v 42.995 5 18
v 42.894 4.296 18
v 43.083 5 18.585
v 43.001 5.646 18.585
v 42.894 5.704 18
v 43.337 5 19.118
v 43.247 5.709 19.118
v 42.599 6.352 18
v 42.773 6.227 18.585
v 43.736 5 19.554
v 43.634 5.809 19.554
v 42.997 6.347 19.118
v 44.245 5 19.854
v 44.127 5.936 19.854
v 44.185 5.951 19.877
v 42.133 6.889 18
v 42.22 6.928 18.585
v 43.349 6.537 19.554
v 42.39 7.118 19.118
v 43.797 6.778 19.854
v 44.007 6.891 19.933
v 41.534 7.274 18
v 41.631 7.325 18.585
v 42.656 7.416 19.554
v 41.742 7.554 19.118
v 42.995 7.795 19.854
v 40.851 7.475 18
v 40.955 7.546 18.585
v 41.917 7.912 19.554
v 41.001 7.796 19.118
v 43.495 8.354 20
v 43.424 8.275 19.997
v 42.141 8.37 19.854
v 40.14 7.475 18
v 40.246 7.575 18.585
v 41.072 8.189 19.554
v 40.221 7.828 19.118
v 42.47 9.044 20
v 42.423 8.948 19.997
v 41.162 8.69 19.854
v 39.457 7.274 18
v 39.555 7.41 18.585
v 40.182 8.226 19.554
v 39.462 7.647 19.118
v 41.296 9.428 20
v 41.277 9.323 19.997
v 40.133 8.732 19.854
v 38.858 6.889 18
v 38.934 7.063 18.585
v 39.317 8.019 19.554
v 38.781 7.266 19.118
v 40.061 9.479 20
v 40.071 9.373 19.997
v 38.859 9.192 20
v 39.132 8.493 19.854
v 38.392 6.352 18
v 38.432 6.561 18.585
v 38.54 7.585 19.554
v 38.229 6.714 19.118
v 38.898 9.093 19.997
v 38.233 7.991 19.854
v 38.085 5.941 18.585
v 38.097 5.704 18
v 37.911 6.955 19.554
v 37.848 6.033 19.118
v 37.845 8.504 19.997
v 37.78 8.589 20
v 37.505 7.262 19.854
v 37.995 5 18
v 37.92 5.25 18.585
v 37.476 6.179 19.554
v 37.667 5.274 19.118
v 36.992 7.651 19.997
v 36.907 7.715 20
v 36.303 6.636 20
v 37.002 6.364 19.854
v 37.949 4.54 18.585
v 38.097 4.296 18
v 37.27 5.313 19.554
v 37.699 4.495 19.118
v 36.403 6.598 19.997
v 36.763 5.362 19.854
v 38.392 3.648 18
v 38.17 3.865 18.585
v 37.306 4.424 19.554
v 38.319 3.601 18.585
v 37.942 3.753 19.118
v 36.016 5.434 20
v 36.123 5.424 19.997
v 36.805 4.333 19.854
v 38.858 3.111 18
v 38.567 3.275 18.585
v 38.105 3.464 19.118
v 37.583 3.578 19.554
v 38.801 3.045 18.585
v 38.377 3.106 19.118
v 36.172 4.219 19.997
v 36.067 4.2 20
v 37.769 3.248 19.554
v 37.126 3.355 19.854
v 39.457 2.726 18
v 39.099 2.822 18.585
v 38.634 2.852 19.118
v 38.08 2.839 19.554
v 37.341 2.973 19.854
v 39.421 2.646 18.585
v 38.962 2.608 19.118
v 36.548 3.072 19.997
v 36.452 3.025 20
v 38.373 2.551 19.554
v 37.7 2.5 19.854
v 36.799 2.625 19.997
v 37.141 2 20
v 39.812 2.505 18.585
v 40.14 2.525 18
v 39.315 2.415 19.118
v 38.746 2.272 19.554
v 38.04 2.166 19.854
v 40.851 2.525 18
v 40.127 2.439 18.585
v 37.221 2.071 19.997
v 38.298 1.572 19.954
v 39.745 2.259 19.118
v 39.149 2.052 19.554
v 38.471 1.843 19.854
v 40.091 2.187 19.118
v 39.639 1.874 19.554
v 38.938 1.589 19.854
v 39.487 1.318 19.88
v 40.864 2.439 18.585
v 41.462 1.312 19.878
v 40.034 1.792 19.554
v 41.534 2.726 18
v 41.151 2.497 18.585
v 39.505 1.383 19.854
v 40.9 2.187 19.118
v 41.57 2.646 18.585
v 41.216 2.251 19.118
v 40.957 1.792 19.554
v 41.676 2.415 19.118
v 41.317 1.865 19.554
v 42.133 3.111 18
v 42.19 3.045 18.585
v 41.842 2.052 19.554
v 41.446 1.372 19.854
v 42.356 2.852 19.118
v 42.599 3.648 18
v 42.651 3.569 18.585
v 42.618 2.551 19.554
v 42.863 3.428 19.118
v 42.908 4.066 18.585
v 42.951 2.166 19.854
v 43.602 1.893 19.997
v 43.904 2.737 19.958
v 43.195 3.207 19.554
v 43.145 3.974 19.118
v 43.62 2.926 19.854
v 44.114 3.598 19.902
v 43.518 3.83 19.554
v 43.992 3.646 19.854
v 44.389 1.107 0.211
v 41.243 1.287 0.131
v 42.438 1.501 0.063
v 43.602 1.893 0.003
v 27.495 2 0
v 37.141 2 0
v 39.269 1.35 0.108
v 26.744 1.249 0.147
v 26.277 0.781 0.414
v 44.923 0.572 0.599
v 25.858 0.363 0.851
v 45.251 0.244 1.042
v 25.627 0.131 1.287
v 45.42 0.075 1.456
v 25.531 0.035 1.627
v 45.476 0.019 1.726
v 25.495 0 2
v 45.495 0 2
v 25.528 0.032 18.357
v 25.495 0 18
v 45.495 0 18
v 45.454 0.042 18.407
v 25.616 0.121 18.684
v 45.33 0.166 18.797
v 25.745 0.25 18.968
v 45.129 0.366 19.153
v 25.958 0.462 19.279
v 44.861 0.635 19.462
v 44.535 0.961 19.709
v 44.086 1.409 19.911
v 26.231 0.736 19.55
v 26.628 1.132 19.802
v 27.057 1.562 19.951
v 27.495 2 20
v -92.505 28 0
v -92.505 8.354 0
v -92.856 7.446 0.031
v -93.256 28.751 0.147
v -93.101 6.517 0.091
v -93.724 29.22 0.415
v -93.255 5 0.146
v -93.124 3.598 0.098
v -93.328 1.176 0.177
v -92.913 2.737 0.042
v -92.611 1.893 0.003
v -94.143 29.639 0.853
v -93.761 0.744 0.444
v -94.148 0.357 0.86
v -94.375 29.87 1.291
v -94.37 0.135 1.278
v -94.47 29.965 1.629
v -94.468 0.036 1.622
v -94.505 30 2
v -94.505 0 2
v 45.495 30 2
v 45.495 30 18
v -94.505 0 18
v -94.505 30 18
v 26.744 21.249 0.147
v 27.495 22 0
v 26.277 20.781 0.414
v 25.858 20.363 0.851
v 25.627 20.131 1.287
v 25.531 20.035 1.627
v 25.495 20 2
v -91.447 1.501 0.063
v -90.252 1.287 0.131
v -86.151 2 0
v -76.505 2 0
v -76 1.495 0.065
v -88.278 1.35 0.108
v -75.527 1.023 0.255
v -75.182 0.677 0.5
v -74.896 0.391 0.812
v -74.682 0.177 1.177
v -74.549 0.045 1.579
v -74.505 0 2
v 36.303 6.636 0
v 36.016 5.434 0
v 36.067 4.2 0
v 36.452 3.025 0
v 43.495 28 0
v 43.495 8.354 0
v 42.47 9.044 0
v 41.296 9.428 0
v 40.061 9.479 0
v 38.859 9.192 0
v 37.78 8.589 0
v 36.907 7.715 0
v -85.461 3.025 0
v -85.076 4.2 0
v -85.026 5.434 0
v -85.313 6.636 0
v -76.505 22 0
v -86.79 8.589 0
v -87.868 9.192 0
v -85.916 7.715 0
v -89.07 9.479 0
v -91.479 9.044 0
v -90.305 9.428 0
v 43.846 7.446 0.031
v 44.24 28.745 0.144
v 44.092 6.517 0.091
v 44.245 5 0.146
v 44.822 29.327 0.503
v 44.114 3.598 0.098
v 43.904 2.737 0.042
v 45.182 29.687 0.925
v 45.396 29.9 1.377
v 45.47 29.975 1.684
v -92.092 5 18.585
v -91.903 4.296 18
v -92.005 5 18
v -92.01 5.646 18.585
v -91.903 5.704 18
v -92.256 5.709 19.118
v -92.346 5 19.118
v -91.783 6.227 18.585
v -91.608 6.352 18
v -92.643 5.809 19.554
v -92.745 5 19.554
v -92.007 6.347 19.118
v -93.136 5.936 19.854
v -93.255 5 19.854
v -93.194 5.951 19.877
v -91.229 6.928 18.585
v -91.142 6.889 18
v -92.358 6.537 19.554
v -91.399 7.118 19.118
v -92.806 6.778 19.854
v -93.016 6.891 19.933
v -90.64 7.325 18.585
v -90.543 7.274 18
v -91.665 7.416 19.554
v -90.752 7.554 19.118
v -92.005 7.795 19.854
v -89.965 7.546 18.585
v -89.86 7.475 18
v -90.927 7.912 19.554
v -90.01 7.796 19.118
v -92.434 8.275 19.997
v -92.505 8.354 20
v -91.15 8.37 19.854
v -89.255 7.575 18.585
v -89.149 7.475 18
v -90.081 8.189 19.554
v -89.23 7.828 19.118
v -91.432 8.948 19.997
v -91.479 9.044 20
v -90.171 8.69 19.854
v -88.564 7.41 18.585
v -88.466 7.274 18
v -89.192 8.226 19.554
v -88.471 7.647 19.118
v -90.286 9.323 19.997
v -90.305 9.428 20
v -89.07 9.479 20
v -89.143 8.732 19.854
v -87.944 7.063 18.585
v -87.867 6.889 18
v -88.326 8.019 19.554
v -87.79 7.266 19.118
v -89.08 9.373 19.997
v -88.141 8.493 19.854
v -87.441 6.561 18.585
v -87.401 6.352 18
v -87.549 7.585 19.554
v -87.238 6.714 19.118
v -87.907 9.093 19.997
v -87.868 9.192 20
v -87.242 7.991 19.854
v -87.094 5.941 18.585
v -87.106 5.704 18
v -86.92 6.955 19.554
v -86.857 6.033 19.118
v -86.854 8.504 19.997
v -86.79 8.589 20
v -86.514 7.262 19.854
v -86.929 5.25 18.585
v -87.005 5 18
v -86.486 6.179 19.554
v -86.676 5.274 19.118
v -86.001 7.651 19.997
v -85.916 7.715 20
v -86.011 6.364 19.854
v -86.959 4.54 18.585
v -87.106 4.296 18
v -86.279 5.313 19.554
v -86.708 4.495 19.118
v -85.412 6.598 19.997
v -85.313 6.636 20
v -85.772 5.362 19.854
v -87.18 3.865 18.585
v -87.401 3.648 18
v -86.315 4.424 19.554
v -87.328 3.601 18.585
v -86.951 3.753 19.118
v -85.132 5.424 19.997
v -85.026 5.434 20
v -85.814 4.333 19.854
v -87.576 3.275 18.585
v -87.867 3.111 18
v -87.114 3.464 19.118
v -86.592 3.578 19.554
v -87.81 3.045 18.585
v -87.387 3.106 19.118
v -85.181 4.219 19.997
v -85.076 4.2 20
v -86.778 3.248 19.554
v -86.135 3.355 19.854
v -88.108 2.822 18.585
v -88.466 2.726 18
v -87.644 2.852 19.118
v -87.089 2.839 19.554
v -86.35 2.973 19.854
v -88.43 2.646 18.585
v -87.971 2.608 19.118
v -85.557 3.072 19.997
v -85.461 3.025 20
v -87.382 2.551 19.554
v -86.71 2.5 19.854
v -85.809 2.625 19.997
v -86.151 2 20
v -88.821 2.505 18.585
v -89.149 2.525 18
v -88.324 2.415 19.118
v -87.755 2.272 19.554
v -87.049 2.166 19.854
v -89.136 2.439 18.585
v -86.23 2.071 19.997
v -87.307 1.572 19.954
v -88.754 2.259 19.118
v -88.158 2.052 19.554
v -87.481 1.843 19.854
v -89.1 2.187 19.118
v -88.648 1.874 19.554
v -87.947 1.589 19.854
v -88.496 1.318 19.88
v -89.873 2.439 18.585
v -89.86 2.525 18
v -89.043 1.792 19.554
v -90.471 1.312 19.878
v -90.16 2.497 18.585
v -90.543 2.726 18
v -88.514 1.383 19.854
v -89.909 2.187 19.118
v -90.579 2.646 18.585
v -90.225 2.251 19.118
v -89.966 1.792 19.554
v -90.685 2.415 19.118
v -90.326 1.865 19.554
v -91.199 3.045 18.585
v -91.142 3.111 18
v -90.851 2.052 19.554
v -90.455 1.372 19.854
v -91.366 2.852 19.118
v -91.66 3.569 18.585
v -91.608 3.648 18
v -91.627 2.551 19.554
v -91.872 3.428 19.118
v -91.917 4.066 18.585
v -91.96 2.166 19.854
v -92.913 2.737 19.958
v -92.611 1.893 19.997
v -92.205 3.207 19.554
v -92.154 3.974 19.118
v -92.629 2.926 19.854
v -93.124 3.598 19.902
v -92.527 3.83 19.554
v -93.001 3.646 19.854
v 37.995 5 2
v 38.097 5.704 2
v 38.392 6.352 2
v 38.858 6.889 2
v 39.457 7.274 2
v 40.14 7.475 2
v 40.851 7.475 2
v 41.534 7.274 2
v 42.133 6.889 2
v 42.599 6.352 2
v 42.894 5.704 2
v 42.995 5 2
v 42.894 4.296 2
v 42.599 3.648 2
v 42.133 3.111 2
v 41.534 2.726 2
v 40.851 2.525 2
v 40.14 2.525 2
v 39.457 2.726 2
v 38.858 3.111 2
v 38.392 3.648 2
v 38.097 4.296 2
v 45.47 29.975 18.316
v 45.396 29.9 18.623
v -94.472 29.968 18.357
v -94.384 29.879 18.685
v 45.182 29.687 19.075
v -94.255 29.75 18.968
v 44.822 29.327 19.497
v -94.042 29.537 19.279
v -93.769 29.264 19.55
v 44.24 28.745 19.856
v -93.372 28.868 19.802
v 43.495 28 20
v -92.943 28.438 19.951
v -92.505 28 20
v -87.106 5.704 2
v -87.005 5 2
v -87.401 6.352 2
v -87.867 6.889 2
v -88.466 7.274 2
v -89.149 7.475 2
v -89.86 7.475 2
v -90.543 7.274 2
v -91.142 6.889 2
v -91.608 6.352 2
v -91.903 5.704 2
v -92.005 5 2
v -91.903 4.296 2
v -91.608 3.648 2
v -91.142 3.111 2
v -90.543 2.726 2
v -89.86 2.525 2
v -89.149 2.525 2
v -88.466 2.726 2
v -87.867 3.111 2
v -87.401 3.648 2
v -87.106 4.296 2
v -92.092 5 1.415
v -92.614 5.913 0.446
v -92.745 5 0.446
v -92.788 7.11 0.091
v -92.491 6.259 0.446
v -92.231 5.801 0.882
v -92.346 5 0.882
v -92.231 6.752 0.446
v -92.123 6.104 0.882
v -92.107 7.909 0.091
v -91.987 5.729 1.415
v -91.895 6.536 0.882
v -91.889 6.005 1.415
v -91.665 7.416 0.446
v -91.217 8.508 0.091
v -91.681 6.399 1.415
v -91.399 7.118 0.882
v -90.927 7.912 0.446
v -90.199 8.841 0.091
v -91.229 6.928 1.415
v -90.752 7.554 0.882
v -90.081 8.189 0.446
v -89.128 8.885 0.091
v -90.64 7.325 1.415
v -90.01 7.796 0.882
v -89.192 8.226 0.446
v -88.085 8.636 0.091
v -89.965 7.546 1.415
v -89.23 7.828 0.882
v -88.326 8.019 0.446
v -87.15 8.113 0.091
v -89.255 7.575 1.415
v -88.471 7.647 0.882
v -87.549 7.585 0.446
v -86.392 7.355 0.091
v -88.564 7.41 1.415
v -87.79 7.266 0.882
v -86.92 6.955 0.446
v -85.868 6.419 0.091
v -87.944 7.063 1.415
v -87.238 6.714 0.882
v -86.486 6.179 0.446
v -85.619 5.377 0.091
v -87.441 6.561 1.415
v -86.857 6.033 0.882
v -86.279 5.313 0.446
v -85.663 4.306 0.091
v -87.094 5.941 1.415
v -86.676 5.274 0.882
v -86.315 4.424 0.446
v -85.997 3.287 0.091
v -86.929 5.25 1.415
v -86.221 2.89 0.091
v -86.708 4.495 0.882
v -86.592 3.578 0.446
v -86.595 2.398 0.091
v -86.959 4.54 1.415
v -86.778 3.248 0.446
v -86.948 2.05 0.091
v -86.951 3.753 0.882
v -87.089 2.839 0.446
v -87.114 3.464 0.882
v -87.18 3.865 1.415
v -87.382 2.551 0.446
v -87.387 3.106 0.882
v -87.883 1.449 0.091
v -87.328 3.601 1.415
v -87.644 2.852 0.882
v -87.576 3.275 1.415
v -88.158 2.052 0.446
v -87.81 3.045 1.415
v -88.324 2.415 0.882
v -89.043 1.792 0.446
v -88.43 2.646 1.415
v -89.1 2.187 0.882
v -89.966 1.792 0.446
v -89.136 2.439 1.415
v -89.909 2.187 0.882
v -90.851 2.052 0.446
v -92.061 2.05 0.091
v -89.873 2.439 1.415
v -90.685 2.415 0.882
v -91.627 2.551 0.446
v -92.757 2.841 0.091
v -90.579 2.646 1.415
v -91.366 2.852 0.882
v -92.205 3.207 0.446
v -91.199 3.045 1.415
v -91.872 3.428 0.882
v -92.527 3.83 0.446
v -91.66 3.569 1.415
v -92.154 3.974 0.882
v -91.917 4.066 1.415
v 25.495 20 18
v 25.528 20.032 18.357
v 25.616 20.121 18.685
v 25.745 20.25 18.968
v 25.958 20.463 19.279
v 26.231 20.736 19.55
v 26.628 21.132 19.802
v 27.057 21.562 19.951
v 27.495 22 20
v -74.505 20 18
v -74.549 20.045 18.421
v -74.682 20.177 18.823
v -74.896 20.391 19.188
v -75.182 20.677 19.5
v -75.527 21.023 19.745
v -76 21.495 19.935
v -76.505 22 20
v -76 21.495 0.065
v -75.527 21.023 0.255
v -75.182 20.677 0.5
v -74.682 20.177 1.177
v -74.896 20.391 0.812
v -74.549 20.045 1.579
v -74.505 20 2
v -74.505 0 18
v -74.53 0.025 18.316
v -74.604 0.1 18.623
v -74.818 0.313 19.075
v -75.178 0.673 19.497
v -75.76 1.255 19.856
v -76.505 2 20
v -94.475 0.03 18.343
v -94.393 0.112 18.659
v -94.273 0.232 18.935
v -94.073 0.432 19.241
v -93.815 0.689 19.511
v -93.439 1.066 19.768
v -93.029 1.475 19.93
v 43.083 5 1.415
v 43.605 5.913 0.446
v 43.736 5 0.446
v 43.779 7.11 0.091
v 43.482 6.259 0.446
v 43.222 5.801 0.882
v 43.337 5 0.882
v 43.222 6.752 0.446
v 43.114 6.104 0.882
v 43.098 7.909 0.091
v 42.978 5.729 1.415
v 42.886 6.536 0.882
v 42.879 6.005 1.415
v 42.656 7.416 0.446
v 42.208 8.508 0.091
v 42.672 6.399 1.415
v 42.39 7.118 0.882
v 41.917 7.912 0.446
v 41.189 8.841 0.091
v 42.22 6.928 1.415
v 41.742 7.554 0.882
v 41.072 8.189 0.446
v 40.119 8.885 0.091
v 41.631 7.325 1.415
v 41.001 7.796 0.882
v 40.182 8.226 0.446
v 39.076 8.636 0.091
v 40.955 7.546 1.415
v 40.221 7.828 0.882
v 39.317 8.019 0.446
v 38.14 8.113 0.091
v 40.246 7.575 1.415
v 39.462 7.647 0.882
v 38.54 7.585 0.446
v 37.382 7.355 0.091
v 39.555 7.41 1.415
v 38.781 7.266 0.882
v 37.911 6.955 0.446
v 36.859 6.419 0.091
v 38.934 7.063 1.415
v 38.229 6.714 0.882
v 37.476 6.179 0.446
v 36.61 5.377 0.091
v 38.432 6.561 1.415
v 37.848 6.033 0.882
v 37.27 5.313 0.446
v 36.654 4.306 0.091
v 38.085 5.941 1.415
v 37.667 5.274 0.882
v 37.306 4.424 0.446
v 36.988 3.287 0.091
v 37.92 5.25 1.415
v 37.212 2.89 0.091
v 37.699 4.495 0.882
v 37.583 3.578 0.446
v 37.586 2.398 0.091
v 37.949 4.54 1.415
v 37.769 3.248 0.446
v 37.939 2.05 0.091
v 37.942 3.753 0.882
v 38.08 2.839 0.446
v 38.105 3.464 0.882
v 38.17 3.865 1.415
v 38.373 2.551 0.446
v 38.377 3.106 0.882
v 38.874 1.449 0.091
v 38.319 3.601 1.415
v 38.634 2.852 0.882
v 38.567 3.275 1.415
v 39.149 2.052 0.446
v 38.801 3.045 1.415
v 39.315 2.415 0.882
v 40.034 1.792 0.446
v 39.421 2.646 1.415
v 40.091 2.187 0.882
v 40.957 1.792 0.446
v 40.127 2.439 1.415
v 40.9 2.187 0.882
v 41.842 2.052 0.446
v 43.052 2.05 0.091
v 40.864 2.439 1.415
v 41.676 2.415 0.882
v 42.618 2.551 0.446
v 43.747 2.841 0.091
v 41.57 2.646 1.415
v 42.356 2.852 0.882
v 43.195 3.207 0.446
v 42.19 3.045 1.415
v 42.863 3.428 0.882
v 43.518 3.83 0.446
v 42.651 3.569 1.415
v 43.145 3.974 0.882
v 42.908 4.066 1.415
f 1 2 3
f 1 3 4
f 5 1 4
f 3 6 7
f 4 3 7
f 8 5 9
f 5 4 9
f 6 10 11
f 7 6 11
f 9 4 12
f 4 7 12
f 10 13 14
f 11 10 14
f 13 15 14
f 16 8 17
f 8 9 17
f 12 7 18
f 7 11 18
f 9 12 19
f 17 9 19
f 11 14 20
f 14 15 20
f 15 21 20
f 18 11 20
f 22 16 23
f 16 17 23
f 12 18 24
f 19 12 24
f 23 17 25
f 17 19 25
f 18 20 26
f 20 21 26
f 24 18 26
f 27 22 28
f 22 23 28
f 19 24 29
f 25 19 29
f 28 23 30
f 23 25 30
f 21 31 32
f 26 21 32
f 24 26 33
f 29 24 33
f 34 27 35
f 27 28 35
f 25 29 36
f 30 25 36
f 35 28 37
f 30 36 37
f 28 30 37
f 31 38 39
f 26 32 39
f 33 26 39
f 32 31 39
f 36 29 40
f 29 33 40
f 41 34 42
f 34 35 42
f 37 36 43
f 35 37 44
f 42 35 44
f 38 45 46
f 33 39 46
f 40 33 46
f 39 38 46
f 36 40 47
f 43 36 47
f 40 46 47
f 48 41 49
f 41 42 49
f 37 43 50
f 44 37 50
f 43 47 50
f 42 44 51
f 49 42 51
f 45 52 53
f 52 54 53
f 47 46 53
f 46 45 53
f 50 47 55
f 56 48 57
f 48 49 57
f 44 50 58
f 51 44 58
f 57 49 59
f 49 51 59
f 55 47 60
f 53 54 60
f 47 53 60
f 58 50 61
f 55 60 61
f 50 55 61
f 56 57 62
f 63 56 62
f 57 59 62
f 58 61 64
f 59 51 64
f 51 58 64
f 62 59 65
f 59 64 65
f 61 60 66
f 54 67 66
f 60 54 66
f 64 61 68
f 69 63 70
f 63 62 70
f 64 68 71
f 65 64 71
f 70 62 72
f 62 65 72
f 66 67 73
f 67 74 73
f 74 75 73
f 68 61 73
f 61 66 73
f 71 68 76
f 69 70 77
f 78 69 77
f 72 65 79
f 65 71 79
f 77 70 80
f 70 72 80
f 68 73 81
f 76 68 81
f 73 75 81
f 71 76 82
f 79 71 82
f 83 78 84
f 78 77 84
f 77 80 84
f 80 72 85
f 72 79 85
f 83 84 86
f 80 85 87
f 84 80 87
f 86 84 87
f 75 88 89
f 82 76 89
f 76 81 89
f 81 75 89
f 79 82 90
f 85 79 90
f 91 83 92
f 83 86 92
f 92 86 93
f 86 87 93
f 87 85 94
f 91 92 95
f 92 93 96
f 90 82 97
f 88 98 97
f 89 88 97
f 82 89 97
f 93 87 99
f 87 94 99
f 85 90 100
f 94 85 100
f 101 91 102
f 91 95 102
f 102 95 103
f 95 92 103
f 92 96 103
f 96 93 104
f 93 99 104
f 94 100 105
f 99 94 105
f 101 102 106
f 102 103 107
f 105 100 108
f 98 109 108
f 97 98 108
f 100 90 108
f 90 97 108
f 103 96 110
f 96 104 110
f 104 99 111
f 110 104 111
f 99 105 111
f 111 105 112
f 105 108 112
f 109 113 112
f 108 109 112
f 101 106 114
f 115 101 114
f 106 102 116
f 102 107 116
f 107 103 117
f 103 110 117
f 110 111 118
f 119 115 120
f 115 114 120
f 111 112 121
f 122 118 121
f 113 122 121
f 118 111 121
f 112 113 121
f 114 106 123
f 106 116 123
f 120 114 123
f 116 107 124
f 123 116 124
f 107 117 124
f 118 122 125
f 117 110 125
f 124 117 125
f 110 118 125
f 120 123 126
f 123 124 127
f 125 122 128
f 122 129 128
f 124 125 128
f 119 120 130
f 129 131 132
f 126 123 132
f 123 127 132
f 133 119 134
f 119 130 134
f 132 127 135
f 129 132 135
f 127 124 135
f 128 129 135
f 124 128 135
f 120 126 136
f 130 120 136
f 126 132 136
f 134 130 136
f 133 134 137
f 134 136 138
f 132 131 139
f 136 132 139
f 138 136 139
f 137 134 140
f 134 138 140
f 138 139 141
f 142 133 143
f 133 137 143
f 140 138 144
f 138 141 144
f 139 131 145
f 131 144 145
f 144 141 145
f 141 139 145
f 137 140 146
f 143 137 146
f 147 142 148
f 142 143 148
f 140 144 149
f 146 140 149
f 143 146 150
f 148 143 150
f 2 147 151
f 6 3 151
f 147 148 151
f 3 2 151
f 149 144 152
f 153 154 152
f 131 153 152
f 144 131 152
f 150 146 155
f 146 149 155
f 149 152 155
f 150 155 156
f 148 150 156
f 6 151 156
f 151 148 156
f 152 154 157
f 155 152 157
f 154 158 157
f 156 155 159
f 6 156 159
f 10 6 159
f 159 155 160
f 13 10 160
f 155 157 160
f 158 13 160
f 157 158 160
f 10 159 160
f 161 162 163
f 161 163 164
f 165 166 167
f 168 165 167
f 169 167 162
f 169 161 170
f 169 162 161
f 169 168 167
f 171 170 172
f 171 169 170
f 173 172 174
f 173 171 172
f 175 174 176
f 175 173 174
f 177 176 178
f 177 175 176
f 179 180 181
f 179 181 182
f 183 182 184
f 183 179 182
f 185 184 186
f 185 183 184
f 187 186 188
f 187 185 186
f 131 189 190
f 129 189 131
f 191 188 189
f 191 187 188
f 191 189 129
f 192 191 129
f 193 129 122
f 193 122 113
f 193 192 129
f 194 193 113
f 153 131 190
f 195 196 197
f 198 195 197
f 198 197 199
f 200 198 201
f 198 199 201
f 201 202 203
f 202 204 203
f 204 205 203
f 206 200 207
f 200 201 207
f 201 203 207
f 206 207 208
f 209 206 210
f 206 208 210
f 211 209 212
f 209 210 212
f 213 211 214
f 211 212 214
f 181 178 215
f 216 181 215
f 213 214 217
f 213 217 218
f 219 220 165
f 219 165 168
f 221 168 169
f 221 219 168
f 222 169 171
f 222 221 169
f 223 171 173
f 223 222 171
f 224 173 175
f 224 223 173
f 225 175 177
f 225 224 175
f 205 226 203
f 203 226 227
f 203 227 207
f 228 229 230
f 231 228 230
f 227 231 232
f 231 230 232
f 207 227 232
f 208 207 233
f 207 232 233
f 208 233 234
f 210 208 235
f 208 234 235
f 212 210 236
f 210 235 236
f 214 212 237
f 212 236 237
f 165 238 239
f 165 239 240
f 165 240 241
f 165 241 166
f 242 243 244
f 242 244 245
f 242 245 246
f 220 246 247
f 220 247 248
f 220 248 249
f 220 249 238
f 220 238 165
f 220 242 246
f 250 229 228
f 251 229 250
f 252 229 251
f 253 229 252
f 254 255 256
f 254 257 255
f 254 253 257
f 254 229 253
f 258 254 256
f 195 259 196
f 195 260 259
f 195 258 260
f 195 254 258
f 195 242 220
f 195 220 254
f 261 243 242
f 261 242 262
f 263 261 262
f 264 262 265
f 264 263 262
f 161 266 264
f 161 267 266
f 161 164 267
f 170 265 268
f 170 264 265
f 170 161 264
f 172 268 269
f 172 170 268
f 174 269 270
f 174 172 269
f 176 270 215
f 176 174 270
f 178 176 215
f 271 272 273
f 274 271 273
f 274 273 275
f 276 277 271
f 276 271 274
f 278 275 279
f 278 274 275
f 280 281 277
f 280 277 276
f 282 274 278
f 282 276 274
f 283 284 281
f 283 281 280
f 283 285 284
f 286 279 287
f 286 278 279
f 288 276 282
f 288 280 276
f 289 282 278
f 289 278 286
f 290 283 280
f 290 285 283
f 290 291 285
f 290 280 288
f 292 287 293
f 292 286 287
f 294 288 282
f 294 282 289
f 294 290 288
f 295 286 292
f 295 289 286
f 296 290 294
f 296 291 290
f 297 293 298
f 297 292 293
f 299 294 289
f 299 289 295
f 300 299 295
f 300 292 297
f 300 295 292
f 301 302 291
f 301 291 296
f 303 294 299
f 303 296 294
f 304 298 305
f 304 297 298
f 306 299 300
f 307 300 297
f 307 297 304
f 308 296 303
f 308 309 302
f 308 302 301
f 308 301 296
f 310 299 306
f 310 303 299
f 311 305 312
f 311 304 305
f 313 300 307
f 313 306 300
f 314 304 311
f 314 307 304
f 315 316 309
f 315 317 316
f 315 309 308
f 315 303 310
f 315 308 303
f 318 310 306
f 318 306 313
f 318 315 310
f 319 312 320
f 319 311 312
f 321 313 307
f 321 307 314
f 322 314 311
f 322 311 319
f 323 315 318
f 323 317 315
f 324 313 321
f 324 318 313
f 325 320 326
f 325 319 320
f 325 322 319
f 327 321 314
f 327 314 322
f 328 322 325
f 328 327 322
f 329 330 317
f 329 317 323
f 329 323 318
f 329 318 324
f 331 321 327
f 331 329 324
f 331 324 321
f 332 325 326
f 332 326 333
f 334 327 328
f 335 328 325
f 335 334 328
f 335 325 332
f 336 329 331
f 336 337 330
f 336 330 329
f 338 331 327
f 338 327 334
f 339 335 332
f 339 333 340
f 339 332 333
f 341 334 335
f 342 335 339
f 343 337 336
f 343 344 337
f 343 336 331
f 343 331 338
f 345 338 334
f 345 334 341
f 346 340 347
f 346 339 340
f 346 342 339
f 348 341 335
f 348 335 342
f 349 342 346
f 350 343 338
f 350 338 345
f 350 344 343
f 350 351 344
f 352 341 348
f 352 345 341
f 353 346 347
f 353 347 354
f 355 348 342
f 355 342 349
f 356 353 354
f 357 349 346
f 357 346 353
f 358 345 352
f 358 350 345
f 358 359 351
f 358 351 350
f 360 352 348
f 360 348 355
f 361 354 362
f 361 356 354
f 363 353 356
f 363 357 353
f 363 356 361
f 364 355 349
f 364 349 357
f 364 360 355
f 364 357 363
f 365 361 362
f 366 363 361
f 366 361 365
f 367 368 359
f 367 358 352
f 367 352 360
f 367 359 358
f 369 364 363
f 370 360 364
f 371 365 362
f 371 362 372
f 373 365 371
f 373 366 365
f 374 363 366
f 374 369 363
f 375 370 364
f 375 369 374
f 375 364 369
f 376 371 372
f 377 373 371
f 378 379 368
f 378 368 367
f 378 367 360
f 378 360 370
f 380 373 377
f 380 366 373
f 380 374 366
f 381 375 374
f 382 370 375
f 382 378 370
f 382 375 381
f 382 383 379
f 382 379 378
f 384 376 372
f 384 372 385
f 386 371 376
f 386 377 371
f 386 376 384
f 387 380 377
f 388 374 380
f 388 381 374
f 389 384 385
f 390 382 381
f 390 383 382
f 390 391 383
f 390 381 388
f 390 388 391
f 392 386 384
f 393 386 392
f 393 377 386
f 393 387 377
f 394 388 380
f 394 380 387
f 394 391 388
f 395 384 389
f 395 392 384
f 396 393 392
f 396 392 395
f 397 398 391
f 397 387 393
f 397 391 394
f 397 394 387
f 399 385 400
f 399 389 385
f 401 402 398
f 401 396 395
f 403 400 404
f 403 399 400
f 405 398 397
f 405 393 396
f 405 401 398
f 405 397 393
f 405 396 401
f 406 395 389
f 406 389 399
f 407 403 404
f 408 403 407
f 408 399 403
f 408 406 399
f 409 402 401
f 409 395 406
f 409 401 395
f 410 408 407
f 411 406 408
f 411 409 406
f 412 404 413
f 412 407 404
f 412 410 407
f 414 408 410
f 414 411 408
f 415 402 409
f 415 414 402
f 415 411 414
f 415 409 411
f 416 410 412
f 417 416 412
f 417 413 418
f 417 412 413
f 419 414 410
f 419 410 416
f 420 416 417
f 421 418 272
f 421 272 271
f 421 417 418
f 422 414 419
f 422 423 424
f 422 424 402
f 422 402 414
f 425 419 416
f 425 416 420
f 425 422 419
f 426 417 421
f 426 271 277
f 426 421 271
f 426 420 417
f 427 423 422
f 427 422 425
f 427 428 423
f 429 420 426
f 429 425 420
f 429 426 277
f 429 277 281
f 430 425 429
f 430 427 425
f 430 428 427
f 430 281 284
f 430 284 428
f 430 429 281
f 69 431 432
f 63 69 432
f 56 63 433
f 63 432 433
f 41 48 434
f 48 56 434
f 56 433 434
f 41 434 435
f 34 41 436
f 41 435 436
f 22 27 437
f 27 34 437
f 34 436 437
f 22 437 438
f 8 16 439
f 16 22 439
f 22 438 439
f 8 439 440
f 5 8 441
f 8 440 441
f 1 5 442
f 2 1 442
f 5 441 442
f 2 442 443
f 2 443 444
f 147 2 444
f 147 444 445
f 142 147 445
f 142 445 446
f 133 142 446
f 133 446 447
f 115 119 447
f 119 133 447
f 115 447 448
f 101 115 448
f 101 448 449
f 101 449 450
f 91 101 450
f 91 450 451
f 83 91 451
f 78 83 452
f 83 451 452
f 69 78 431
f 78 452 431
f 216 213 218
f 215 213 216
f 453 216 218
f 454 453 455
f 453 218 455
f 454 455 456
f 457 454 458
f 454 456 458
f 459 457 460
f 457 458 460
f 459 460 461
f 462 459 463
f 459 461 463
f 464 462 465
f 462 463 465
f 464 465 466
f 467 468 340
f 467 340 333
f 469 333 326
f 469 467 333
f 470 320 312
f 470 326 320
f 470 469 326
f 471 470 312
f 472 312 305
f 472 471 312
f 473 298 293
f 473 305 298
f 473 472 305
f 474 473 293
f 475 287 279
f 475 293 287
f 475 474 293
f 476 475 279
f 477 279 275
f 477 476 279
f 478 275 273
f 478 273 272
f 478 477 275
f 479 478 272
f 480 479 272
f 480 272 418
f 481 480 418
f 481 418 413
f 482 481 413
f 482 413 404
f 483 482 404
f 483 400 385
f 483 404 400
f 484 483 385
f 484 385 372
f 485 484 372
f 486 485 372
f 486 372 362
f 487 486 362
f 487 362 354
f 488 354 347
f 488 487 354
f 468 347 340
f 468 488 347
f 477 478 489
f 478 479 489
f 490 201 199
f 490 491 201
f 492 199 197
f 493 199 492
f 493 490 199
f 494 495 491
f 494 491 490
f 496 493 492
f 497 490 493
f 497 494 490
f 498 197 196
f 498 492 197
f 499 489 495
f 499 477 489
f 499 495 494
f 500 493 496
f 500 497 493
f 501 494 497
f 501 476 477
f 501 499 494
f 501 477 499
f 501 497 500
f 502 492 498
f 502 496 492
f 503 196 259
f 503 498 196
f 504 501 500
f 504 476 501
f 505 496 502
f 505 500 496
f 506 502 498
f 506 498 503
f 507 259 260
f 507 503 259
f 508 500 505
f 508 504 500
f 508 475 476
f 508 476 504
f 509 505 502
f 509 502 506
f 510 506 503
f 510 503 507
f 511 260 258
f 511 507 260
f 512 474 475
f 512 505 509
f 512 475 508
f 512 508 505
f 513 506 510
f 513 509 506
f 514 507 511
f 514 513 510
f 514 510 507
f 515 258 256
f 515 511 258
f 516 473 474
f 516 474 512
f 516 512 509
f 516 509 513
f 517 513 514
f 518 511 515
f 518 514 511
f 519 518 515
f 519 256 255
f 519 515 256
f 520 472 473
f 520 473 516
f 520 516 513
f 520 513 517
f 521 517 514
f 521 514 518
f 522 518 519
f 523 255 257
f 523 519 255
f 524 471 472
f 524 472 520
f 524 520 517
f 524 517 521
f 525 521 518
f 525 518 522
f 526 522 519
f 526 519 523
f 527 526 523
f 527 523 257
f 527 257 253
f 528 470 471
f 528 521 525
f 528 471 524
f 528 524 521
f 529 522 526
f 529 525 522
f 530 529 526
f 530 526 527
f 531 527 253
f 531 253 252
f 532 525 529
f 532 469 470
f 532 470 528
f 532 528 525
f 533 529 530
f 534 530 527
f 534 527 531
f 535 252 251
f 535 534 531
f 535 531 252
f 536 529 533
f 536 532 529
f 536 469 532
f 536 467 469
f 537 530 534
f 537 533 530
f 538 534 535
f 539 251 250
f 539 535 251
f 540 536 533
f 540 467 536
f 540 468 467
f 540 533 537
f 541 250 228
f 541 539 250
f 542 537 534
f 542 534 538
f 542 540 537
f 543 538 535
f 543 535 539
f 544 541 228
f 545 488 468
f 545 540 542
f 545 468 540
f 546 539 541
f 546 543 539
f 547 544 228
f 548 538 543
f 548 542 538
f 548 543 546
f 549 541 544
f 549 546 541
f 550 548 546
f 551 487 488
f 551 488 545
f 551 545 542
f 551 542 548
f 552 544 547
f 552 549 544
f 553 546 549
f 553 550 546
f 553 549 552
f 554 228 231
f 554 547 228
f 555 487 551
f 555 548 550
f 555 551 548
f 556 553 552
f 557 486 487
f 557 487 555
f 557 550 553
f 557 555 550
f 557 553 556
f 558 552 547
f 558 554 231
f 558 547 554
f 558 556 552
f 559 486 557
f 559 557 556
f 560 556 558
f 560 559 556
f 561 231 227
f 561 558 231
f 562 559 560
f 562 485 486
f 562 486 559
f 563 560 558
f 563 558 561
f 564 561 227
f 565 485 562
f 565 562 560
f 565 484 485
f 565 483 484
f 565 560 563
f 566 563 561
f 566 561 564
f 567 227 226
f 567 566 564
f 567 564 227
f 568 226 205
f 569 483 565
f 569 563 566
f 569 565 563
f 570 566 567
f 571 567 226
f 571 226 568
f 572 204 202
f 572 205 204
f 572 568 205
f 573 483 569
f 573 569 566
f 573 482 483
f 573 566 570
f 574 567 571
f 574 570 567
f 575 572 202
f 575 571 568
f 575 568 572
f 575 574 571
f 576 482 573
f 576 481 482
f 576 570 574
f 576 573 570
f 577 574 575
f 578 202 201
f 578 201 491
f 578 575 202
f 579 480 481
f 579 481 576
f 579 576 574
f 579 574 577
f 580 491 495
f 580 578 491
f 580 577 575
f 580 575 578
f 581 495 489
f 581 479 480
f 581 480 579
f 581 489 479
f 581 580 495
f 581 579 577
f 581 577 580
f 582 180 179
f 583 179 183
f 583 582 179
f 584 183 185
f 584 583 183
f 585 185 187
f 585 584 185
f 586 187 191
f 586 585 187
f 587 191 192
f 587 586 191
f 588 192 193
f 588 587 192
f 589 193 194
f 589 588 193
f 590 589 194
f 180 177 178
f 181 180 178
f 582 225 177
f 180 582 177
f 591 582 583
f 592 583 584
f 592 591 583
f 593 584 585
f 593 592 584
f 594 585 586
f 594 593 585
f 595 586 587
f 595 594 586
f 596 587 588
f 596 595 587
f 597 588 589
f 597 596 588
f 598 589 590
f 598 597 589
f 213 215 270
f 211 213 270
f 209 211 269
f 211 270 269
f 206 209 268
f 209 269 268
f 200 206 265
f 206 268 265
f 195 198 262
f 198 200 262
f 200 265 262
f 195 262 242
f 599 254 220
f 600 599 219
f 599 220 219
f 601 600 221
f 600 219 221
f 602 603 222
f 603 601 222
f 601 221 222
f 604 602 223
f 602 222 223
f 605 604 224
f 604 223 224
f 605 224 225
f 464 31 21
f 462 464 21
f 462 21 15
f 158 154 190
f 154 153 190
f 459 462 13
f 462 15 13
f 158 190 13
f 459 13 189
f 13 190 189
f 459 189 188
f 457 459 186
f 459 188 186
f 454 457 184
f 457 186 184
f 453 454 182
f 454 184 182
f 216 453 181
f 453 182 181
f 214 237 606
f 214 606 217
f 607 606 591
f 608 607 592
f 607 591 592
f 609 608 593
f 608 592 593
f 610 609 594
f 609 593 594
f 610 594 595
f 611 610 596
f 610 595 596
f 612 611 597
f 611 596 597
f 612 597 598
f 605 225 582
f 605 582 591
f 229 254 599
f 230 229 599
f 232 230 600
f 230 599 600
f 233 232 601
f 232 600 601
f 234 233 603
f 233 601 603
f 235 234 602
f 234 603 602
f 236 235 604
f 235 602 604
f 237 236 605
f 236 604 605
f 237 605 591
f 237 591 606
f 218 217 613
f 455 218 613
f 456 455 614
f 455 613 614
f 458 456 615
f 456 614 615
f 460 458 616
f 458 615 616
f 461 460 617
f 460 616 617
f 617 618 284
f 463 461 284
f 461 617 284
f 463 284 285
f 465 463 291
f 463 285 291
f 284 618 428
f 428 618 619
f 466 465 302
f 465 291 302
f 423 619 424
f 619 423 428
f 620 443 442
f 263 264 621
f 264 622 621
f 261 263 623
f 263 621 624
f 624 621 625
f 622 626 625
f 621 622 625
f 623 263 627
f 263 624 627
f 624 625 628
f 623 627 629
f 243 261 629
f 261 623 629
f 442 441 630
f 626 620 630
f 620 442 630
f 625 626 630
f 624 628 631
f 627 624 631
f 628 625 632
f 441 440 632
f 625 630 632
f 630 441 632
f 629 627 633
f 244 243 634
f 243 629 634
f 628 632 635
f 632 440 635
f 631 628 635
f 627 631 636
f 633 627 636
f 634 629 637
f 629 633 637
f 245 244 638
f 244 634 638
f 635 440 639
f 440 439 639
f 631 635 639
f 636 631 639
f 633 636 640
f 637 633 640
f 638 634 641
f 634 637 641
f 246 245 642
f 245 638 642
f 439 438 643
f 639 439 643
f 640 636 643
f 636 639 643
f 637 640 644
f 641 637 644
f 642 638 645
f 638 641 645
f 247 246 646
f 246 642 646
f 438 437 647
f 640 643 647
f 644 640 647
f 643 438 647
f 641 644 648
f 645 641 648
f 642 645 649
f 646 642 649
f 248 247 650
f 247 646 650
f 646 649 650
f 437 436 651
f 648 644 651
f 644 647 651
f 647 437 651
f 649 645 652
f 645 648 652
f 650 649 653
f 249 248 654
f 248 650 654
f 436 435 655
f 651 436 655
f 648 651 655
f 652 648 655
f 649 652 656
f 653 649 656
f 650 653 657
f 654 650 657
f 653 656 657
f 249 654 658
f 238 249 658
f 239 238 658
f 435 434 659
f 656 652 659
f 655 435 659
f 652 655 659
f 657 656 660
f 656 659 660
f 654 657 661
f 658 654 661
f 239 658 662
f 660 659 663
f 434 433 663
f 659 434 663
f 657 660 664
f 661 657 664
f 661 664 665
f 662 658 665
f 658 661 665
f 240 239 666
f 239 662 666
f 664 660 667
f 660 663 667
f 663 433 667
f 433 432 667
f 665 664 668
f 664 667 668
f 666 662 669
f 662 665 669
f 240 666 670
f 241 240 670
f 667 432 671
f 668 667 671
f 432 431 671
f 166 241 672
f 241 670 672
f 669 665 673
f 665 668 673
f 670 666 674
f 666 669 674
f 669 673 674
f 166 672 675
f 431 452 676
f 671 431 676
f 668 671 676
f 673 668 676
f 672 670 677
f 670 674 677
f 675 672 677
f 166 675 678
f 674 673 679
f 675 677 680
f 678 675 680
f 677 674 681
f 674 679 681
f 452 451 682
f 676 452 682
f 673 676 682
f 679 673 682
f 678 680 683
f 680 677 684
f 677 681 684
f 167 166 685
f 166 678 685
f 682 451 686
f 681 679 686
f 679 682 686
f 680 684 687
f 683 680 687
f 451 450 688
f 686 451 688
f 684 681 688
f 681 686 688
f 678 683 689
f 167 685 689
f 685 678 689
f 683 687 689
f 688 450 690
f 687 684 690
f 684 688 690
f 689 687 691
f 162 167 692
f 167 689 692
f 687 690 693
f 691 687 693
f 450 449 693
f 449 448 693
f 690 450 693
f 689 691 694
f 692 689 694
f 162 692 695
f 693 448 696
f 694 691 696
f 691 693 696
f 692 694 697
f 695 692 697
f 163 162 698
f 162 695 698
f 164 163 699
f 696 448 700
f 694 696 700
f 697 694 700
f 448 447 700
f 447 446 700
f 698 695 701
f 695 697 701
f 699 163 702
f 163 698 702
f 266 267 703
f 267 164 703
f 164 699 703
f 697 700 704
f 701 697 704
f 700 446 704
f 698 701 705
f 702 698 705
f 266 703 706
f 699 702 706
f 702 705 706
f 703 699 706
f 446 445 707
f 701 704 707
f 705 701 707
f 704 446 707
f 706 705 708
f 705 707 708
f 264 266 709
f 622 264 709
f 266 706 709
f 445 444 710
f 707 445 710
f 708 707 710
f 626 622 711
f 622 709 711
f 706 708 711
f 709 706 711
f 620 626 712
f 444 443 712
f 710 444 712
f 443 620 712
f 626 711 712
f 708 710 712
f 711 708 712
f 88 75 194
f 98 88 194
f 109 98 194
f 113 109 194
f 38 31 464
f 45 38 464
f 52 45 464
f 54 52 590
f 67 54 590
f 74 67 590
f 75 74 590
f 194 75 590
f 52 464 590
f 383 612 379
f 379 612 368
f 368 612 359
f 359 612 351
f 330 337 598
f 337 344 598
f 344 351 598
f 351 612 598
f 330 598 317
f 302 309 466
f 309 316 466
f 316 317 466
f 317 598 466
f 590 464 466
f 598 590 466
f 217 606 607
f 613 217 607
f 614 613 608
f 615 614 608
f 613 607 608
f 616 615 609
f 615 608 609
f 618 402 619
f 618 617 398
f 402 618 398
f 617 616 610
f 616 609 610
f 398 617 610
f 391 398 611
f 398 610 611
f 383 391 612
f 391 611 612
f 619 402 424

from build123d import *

# Parameters (mm, degrees)
F1_DEPTH     = 20
F3_D         = 5
F5_T3_DEPTH  = 150
F5_T6_DEPTH  = 40
F5_T9_DEPTH  = 30
F5_T12_DEPTH = 25
F5_T15_DEPTH = 100
F5_T18_DEPTH = 25
F5_T21_DEPTH = 30
F5_T24_DEPTH = 40
F5_T33_DEPTH = 150
F5_T36_DEPTH = 40
F5_T39_DEPTH = 30
F5_T42_DEPTH = 25
F5_T45_DEPTH = 100
F5_T48_DEPTH = 25
F5_T51_DEPTH = 30
F5_T54_DEPTH = 40
F5_T64_DEPTH = 105
F5_T68_DEPTH = 30
F5_T74_DEPTH = 30
F5_T78_DEPTH = 105
F5_T84_DEPTH = 30
F5_T88_DEPTH = 105
F5_T94_DEPTH = 105
F5_T98_DEPTH = 30


# Not quite as in the source:
# - a fillet or chamfer that OpenCascade refuses, or shapes differently, is made with other operations: its cross-section is extruded or revolved along the edge and cut away or added


with BuildPart() as f1:
    # F0 (on Top) → F1 (new body)
    with BuildSketch(Plane.XY):
        Polygon((45.4953936456, 30), (-24.5046063544, 30), (-24.5046063544, 20), (25.4953936456, 20), (25.4953936456, 0), (45.4953936456, 0), align=None)
    extrude(amount=F1_DEPTH)

    # F3 (through all)
    with Locations(Plane.XY.offset(20)):
        with Locations((40.4953936456, 5)):
            Hole(F3_D / 2)

    # F4: F1 across face


with BuildPart() as f1_1:
    add(f1.part)
    add(f1.part.mirror(Plane(origin=(-24.5046063544, 25, 10), x_dir=(0, -1, 0), z_dir=(-1, 0, 0))))

    # F5: fillet of radius 2 on 20 edges, made by hand


with BuildPart() as f5_tool1:
    # F5_s2 → F5_t3 (new body)
    with BuildSketch(Plane.YZ.offset(-99.5046063544)):
        with BuildLine():
            ThreePointArc((30, 18), (29.4142135624, 19.4142135624), (28, 20))
            Line((28, 20), (30, 20))
            Line((30, 20), (30, 18))
        make_face()
    extrude(amount=F5_T3_DEPTH)


with BuildPart() as f5_tool4:
    # F5_s5 → F5_t6 (new body)
    with BuildSketch(Plane.XZ.offset(5)):
        with BuildLine():
            ThreePointArc((-94.5046063544, 18), (-93.9188199167, 19.4142135624), (-92.5046063544, 20))
            Line((-92.5046063544, 20), (-94.5046063544, 20))
            Line((-94.5046063544, 20), (-94.5046063544, 18))
        make_face()
    extrude(amount=-F5_T6_DEPTH)


with BuildPart() as f5_tool7:
    # F5_s8 → F5_t9 (new body)
    with BuildSketch(Plane.YZ.offset(-69.5046063544)):
        with BuildLine():
            ThreePointArc((0, 18), (0.5857864376, 19.4142135624), (2, 20))
            Line((2, 20), (0, 20))
            Line((0, 20), (0, 18))
        make_face()
    extrude(amount=-F5_T9_DEPTH)


with BuildPart() as f5_tool10:
    # F5_s11 → F5_t12 (new body)
    with BuildSketch(Plane.XZ.offset(-20)):
        with BuildLine():
            ThreePointArc((-74.5046063544, 18), (-75.090392792, 19.4142135624), (-76.5046063544, 20))
            Line((-76.5046063544, 20), (-74.5046063544, 20))
            Line((-74.5046063544, 20), (-74.5046063544, 18))
        make_face()
    extrude(amount=F5_T12_DEPTH)


with BuildPart() as f5_tool13:
    # F5_s14 → F5_t15 (new body)
    with BuildSketch(Plane.YZ.offset(-74.5046063544)):
        with BuildLine():
            ThreePointArc((20, 18), (20.5857864376, 19.4142135624), (22, 20))
            Line((22, 20), (20, 20))
            Line((20, 20), (20, 18))
        make_face()
    extrude(amount=F5_T15_DEPTH)


with BuildPart() as f5_tool16:
    # F5_s17 → F5_t18 (new body)
    with BuildSketch(Plane.XZ.offset(-20)):
        with BuildLine():
            ThreePointArc((25.4953936456, 18), (26.0811800833, 19.4142135624), (27.4953936456, 20))
            Line((27.4953936456, 20), (25.4953936456, 20))
            Line((25.4953936456, 20), (25.4953936456, 18))
        make_face()
    extrude(amount=F5_T18_DEPTH)


with BuildPart() as f5_tool19:
    # F5_s20 → F5_t21 (new body)
    with BuildSketch(Plane.YZ.offset(20.4953936456)):
        with BuildLine():
            ThreePointArc((0, 18), (0.5857864376, 19.4142135624), (2, 20))
            Line((2, 20), (0, 20))
            Line((0, 20), (0, 18))
        make_face()
    extrude(amount=F5_T21_DEPTH)


with BuildPart() as f5_tool22:
    # F5_s23 → F5_t24 (new body)
    with BuildSketch(Plane.XZ.offset(5)):
        with BuildLine():
            ThreePointArc((43.4953936456, 20), (44.909607208, 19.4142135624), (45.4953936456, 18))
            Line((45.4953936456, 18), (45.4953936456, 20))
            Line((45.4953936456, 20), (43.4953936456, 20))
        make_face()
    extrude(amount=-F5_T24_DEPTH)


with BuildPart() as f5_tool25:
    # F5_s26 → F5_t27 (revolve)
    with BuildSketch(Plane.XZ.offset(-5)):
        with BuildLine():
            ThreePointArc((42.9953936456, 18), (43.5811800833, 19.4142135624), (44.9953936456, 20))
            Line((44.9953936456, 20), (42.9953936456, 20))
            Line((42.9953936456, 20), (42.9953936456, 18))
        make_face()
    revolve(axis=Axis((40.4953936456, 5, 20), (0, 0, 1)))


with BuildPart() as f5_tool28:
    # F5_s29 → F5_t30 (revolve)
    with BuildSketch(Plane.XZ.offset(-5)):
        with BuildLine():
            ThreePointArc((-92.0046063544, 18), (-92.590392792, 19.4142135624), (-94.0046063544, 20))
            Line((-94.0046063544, 20), (-92.0046063544, 20))
            Line((-92.0046063544, 20), (-92.0046063544, 18))
        make_face()
    revolve(axis=Axis((-89.5046063544, 5, 20), (0, 0, -1)))


with BuildPart() as f5_tool31:
    # F5_s32 → F5_t33 (new body)
    with BuildSketch(Plane.YZ.offset(50.4953936456)):
        with BuildLine():
            ThreePointArc((30, 2), (29.4142135624, 0.5857864376), (28, 0))
            Line((28, 0), (30, 0))
            Line((30, 0), (30, 2))
        make_face()
    extrude(amount=-F5_T33_DEPTH)


with BuildPart() as f5_tool34:
    # F5_s35 → F5_t36 (new body)
    with BuildSketch(Plane.XZ.offset(5)):
        with BuildLine():
            ThreePointArc((-92.5046063544, 0), (-93.9188199167, 0.5857864376), (-94.5046063544, 2))
            Line((-94.5046063544, 2), (-94.5046063544, 0))
            Line((-94.5046063544, 0), (-92.5046063544, 0))
        make_face()
    extrude(amount=-F5_T36_DEPTH)


with BuildPart() as f5_tool37:
    # F5_s38 → F5_t39 (new body)
    with BuildSketch(Plane.YZ.offset(-69.5046063544)):
        with BuildLine():
            ThreePointArc((2, 0), (0.5857864376, 0.5857864376), (0, 2))
            Line((0, 2), (0, 0))
            Line((0, 0), (2, 0))
        make_face()
    extrude(amount=-F5_T39_DEPTH)


with BuildPart() as f5_tool40:
    # F5_s41 → F5_t42 (new body)
    with BuildSketch(Plane.XZ.offset(-20)):
        with BuildLine():
            ThreePointArc((-76.5046063544, 0), (-75.090392792, 0.5857864376), (-74.5046063544, 2))
            Line((-74.5046063544, 2), (-74.5046063544, 0))
            Line((-74.5046063544, 0), (-76.5046063544, 0))
        make_face()
    extrude(amount=F5_T42_DEPTH)


with BuildPart() as f5_tool43:
    # F5_s44 → F5_t45 (new body)
    with BuildSketch(Plane.YZ.offset(25.4953936456)):
        with BuildLine():
            ThreePointArc((22, 0), (20.5857864376, 0.5857864376), (20, 2))
            Line((20, 2), (20, 0))
            Line((20, 0), (22, 0))
        make_face()
    extrude(amount=-F5_T45_DEPTH)


with BuildPart() as f5_tool46:
    # F5_s47 → F5_t48 (new body)
    with BuildSketch(Plane.XZ.offset(-20)):
        with BuildLine():
            ThreePointArc((27.4953936456, 0), (26.0811800833, 0.5857864376), (25.4953936456, 2))
            Line((25.4953936456, 2), (25.4953936456, 0))
            Line((25.4953936456, 0), (27.4953936456, 0))
        make_face()
    extrude(amount=F5_T48_DEPTH)


with BuildPart() as f5_tool49:
    # F5_s50 → F5_t51 (new body)
    with BuildSketch(Plane.YZ.offset(20.4953936456)):
        with BuildLine():
            ThreePointArc((2, 0), (0.5857864376, 0.5857864376), (0, 2))
            Line((0, 2), (0, 0))
            Line((0, 0), (2, 0))
        make_face()
    extrude(amount=F5_T51_DEPTH)


with BuildPart() as f5_tool52:
    # F5_s53 → F5_t54 (new body)
    with BuildSketch(Plane.XZ.offset(5)):
        with BuildLine():
            ThreePointArc((43.4953936456, 0), (44.909607208, 0.5857864376), (45.4953936456, 2))
            Line((45.4953936456, 2), (45.4953936456, 0))
            Line((45.4953936456, 0), (43.4953936456, 0))
        make_face()
    extrude(amount=-F5_T54_DEPTH)


with BuildPart() as f5_tool55:
    # F5_s56 → F5_t57 (revolve)
    with BuildSketch(Plane.XZ.offset(-5)):
        with BuildLine():
            ThreePointArc((44.9953936456, 0), (43.5811800833, 0.5857864376), (42.9953936456, 2))
            Line((42.9953936456, 2), (42.9953936456, 0))
            Line((42.9953936456, 0), (44.9953936456, 0))
        make_face()
    revolve(axis=Axis((40.4953936456, 5, 0), (0, 0, 1)))


with BuildPart() as f5_tool58:
    # F5_s59 → F5_t60 (revolve)
    with BuildSketch(Plane.XZ.offset(-5)):
        with BuildLine():
            ThreePointArc((-94.0046063544, 0), (-92.590392792, 0.5857864376), (-92.0046063544, 2))
            Line((-92.0046063544, 2), (-92.0046063544, 0))
            Line((-92.0046063544, 0), (-94.0046063544, 0))
        make_face()
    revolve(axis=Axis((-89.5046063544, 5, 0), (0, 0, -1)))


with BuildPart() as f5_tool62:
    # F5_s63 → F5_t64 (new body)
    with BuildSketch(Plane.YZ.offset(-79.5046063544)):
        with BuildLine():
            ThreePointArc((20, 18), (20.5857864376, 19.4142135624), (22, 20))
            Line((22, 20), (20, 20))
            Line((20, 20), (20, 18))
        make_face()
    extrude(amount=F5_T64_DEPTH)

    split(bisect_by=Plane.YZ.offset(-74.5046063544), keep=Keep.BOTTOM)


with BuildPart() as f5_tool66:
    # F5_s67 → F5_t68 (new body)
    with BuildSketch(Plane.XZ.offset(-25)):
        with BuildLine():
            ThreePointArc((-74.5046063544, 18), (-75.090392792, 19.4142135624), (-76.5046063544, 20))
            Line((-76.5046063544, 20), (-74.5046063544, 20))
            Line((-74.5046063544, 20), (-74.5046063544, 18))
        make_face()
    extrude(amount=F5_T68_DEPTH)

    split(bisect_by=Plane.XZ.offset(-20), keep=Keep.BOTTOM)


with BuildPart() as f5_tool62_1:
    add(f5_tool62.part)

    # F5_t70: intersect F5_tool66
    add(f5_tool66.part, mode=Mode.INTERSECT)


with BuildPart() as f5_tool72:
    # F5_s73 → F5_t74 (new body)
    with BuildSketch(Plane.XZ.offset(-25)):
        with BuildLine():
            ThreePointArc((25.4953936456, 18), (26.0811800833, 19.4142135624), (27.4953936456, 20))
            Line((27.4953936456, 20), (25.4953936456, 20))
            Line((25.4953936456, 20), (25.4953936456, 18))
        make_face()
    extrude(amount=F5_T74_DEPTH)

    split(bisect_by=Plane.XZ.offset(-20), keep=Keep.BOTTOM)


with BuildPart() as f5_tool76:
    # F5_s77 → F5_t78 (new body)
    with BuildSketch(Plane.YZ.offset(-74.5046063544)):
        with BuildLine():
            ThreePointArc((20, 18), (20.5857864376, 19.4142135624), (22, 20))
            Line((22, 20), (20, 20))
            Line((20, 20), (20, 18))
        make_face()
    extrude(amount=F5_T78_DEPTH)

    split(bisect_by=Plane.YZ.offset(25.4953936456), keep=Keep.TOP)


with BuildPart() as f5_tool72_1:
    add(f5_tool72.part)

    # F5_t80: intersect F5_tool76
    add(f5_tool76.part, mode=Mode.INTERSECT)


with BuildPart() as f5_tool82:
    # F5_s83 → F5_t84 (new body)
    with BuildSketch(Plane.XZ.offset(-25)):
        with BuildLine():
            ThreePointArc((-76.5046063544, 0), (-75.090392792, 0.5857864376), (-74.5046063544, 2))
            Line((-74.5046063544, 2), (-74.5046063544, 0))
            Line((-74.5046063544, 0), (-76.5046063544, 0))
        make_face()
    extrude(amount=F5_T84_DEPTH)

    split(bisect_by=Plane.XZ.offset(-20), keep=Keep.BOTTOM)


with BuildPart() as f5_tool86:
    # F5_s87 → F5_t88 (new body)
    with BuildSketch(Plane.YZ.offset(25.4953936456)):
        with BuildLine():
            ThreePointArc((22, 0), (20.5857864376, 0.5857864376), (20, 2))
            Line((20, 2), (20, 0))
            Line((20, 0), (22, 0))
        make_face()
    extrude(amount=-F5_T88_DEPTH)

    split(bisect_by=Plane.YZ.offset(-74.5046063544), keep=Keep.BOTTOM)


with BuildPart() as f5_tool82_1:
    add(f5_tool82.part)

    # F5_t90: intersect F5_tool86
    add(f5_tool86.part, mode=Mode.INTERSECT)


with BuildPart() as f5_tool92:
    # F5_s93 → F5_t94 (new body)
    with BuildSketch(Plane.YZ.offset(30.4953936456)):
        with BuildLine():
            ThreePointArc((22, 0), (20.5857864376, 0.5857864376), (20, 2))
            Line((20, 2), (20, 0))
            Line((20, 0), (22, 0))
        make_face()
    extrude(amount=-F5_T94_DEPTH)

    split(bisect_by=Plane.YZ.offset(25.4953936456), keep=Keep.TOP)


with BuildPart() as f5_tool96:
    # F5_s97 → F5_t98 (new body)
    with BuildSketch(Plane.XZ.offset(-25)):
        with BuildLine():
            ThreePointArc((27.4953936456, 0), (26.0811800833, 0.5857864376), (25.4953936456, 2))
            Line((25.4953936456, 2), (25.4953936456, 0))
            Line((25.4953936456, 0), (27.4953936456, 0))
        make_face()
    extrude(amount=F5_T98_DEPTH)

    split(bisect_by=Plane.XZ.offset(-20), keep=Keep.BOTTOM)


with BuildPart() as f5_tool92_1:
    add(f5_tool92.part)

    # F5_t100: intersect F5_tool96
    add(f5_tool96.part, mode=Mode.INTERSECT)


with BuildPart() as f1_2:
    add(f1_1.part)

    # F5_t101: cut F5_tool1, F5_tool4, F5_tool7, F5_tool10, F5_tool13, F5_tool16, F5_tool19, F5_tool22, F5_tool25, F5_tool28, F5_tool31, F5_tool34, F5_tool37, F5_tool40, F5_tool43, F5_tool46, F5_tool49, F5_tool52, F5_tool55, F5_tool58, F5_tool62, F5_tool72, F5_tool82, F5_tool92
    add([f5_tool1.part, f5_tool4.part, f5_tool7.part, f5_tool10.part, f5_tool13.part, f5_tool16.part, f5_tool19.part, f5_tool22.part, f5_tool25.part, f5_tool28.part, f5_tool31.part, f5_tool34.part, f5_tool37.part, f5_tool40.part, f5_tool43.part, f5_tool46.part, f5_tool49.part, f5_tool52.part, f5_tool55.part, f5_tool58.part, f5_tool62_1.part, f5_tool72_1.part, f5_tool82_1.part, f5_tool92_1.part], mode=Mode.SUBTRACT)


solid = f1_2.part
